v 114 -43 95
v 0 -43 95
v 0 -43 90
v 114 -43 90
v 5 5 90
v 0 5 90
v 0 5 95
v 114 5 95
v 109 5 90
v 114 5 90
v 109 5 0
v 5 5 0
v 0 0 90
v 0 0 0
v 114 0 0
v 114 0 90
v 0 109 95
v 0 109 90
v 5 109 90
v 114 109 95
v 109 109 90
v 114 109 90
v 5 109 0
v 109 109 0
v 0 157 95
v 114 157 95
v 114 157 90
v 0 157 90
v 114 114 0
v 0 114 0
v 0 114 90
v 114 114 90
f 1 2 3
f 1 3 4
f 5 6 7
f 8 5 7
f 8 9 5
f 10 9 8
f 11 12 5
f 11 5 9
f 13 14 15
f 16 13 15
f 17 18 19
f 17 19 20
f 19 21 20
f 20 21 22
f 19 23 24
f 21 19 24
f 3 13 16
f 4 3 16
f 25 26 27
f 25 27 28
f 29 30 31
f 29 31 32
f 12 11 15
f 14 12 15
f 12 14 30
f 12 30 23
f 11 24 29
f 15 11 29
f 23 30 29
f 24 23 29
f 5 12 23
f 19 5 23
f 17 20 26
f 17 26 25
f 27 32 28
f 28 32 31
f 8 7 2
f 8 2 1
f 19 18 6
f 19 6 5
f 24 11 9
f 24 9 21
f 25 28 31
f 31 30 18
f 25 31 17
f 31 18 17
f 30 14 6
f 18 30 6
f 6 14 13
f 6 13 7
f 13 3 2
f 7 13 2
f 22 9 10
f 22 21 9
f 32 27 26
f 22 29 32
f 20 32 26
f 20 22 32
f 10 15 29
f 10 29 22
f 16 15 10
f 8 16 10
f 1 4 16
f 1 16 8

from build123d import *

# Parameters (mm, degrees)
SKETCH001_W   = 114
SKETCH001_H   = 5
SKETCH001_W_2 = 5
SKETCH001_H_2 = 104
PAD001_DEPTH  = 90
SKETCH_W      = 114
SKETCH_H      = 5
PAD_DEPTH     = 5
SKETCH002_W   = 114
SKETCH002_H   = 5
PAD002_DEPTH  = 43
SKETCH003_W   = 114
SKETCH003_H   = 5
PAD003_DEPTH  = 43


with BuildPart() as part:
    # Sketch001 → Pad001 (new body)
    with BuildSketch(Plane.XY):
        with Locations((57, 2.5)):
            Rectangle(SKETCH001_W, SKETCH001_H)
        with Locations((2.5, 57)):
            Rectangle(SKETCH001_W_2, SKETCH001_H_2)
        with Locations((111.5, 57)):
            Rectangle(SKETCH001_W_2, SKETCH001_H_2)
        with Locations((57, 111.5)):
            Rectangle(SKETCH001_W, SKETCH001_H)
    extrude(amount=PAD001_DEPTH)

    # Sketch → Pad (new body)
    with BuildSketch(Plane.XY.offset(90)):
        with Locations((57, 111.5)):
            Rectangle(SKETCH_W, SKETCH_H)
        with Locations((57, 2.5)):
            Rectangle(SKETCH_W, SKETCH_H)
    extrude(amount=PAD_DEPTH)

    # Sketch002 → Pad002 (new body)
    with BuildSketch(Plane.XZ):
        with Locations((57, 92.5)):
            Rectangle(SKETCH002_W, SKETCH002_H)
    extrude(amount=PAD002_DEPTH)

    # Sketch003 → Pad003 (new body)
    with BuildSketch(Plane(origin=(0, 114, 0), x_dir=(-1, 0, 0), z_dir=(0, 1, 0))):
        with Locations((-57, 92.5)):
            Rectangle(SKETCH003_W, SKETCH003_H)
    extrude(amount=PAD003_DEPTH)


solid = part.part
